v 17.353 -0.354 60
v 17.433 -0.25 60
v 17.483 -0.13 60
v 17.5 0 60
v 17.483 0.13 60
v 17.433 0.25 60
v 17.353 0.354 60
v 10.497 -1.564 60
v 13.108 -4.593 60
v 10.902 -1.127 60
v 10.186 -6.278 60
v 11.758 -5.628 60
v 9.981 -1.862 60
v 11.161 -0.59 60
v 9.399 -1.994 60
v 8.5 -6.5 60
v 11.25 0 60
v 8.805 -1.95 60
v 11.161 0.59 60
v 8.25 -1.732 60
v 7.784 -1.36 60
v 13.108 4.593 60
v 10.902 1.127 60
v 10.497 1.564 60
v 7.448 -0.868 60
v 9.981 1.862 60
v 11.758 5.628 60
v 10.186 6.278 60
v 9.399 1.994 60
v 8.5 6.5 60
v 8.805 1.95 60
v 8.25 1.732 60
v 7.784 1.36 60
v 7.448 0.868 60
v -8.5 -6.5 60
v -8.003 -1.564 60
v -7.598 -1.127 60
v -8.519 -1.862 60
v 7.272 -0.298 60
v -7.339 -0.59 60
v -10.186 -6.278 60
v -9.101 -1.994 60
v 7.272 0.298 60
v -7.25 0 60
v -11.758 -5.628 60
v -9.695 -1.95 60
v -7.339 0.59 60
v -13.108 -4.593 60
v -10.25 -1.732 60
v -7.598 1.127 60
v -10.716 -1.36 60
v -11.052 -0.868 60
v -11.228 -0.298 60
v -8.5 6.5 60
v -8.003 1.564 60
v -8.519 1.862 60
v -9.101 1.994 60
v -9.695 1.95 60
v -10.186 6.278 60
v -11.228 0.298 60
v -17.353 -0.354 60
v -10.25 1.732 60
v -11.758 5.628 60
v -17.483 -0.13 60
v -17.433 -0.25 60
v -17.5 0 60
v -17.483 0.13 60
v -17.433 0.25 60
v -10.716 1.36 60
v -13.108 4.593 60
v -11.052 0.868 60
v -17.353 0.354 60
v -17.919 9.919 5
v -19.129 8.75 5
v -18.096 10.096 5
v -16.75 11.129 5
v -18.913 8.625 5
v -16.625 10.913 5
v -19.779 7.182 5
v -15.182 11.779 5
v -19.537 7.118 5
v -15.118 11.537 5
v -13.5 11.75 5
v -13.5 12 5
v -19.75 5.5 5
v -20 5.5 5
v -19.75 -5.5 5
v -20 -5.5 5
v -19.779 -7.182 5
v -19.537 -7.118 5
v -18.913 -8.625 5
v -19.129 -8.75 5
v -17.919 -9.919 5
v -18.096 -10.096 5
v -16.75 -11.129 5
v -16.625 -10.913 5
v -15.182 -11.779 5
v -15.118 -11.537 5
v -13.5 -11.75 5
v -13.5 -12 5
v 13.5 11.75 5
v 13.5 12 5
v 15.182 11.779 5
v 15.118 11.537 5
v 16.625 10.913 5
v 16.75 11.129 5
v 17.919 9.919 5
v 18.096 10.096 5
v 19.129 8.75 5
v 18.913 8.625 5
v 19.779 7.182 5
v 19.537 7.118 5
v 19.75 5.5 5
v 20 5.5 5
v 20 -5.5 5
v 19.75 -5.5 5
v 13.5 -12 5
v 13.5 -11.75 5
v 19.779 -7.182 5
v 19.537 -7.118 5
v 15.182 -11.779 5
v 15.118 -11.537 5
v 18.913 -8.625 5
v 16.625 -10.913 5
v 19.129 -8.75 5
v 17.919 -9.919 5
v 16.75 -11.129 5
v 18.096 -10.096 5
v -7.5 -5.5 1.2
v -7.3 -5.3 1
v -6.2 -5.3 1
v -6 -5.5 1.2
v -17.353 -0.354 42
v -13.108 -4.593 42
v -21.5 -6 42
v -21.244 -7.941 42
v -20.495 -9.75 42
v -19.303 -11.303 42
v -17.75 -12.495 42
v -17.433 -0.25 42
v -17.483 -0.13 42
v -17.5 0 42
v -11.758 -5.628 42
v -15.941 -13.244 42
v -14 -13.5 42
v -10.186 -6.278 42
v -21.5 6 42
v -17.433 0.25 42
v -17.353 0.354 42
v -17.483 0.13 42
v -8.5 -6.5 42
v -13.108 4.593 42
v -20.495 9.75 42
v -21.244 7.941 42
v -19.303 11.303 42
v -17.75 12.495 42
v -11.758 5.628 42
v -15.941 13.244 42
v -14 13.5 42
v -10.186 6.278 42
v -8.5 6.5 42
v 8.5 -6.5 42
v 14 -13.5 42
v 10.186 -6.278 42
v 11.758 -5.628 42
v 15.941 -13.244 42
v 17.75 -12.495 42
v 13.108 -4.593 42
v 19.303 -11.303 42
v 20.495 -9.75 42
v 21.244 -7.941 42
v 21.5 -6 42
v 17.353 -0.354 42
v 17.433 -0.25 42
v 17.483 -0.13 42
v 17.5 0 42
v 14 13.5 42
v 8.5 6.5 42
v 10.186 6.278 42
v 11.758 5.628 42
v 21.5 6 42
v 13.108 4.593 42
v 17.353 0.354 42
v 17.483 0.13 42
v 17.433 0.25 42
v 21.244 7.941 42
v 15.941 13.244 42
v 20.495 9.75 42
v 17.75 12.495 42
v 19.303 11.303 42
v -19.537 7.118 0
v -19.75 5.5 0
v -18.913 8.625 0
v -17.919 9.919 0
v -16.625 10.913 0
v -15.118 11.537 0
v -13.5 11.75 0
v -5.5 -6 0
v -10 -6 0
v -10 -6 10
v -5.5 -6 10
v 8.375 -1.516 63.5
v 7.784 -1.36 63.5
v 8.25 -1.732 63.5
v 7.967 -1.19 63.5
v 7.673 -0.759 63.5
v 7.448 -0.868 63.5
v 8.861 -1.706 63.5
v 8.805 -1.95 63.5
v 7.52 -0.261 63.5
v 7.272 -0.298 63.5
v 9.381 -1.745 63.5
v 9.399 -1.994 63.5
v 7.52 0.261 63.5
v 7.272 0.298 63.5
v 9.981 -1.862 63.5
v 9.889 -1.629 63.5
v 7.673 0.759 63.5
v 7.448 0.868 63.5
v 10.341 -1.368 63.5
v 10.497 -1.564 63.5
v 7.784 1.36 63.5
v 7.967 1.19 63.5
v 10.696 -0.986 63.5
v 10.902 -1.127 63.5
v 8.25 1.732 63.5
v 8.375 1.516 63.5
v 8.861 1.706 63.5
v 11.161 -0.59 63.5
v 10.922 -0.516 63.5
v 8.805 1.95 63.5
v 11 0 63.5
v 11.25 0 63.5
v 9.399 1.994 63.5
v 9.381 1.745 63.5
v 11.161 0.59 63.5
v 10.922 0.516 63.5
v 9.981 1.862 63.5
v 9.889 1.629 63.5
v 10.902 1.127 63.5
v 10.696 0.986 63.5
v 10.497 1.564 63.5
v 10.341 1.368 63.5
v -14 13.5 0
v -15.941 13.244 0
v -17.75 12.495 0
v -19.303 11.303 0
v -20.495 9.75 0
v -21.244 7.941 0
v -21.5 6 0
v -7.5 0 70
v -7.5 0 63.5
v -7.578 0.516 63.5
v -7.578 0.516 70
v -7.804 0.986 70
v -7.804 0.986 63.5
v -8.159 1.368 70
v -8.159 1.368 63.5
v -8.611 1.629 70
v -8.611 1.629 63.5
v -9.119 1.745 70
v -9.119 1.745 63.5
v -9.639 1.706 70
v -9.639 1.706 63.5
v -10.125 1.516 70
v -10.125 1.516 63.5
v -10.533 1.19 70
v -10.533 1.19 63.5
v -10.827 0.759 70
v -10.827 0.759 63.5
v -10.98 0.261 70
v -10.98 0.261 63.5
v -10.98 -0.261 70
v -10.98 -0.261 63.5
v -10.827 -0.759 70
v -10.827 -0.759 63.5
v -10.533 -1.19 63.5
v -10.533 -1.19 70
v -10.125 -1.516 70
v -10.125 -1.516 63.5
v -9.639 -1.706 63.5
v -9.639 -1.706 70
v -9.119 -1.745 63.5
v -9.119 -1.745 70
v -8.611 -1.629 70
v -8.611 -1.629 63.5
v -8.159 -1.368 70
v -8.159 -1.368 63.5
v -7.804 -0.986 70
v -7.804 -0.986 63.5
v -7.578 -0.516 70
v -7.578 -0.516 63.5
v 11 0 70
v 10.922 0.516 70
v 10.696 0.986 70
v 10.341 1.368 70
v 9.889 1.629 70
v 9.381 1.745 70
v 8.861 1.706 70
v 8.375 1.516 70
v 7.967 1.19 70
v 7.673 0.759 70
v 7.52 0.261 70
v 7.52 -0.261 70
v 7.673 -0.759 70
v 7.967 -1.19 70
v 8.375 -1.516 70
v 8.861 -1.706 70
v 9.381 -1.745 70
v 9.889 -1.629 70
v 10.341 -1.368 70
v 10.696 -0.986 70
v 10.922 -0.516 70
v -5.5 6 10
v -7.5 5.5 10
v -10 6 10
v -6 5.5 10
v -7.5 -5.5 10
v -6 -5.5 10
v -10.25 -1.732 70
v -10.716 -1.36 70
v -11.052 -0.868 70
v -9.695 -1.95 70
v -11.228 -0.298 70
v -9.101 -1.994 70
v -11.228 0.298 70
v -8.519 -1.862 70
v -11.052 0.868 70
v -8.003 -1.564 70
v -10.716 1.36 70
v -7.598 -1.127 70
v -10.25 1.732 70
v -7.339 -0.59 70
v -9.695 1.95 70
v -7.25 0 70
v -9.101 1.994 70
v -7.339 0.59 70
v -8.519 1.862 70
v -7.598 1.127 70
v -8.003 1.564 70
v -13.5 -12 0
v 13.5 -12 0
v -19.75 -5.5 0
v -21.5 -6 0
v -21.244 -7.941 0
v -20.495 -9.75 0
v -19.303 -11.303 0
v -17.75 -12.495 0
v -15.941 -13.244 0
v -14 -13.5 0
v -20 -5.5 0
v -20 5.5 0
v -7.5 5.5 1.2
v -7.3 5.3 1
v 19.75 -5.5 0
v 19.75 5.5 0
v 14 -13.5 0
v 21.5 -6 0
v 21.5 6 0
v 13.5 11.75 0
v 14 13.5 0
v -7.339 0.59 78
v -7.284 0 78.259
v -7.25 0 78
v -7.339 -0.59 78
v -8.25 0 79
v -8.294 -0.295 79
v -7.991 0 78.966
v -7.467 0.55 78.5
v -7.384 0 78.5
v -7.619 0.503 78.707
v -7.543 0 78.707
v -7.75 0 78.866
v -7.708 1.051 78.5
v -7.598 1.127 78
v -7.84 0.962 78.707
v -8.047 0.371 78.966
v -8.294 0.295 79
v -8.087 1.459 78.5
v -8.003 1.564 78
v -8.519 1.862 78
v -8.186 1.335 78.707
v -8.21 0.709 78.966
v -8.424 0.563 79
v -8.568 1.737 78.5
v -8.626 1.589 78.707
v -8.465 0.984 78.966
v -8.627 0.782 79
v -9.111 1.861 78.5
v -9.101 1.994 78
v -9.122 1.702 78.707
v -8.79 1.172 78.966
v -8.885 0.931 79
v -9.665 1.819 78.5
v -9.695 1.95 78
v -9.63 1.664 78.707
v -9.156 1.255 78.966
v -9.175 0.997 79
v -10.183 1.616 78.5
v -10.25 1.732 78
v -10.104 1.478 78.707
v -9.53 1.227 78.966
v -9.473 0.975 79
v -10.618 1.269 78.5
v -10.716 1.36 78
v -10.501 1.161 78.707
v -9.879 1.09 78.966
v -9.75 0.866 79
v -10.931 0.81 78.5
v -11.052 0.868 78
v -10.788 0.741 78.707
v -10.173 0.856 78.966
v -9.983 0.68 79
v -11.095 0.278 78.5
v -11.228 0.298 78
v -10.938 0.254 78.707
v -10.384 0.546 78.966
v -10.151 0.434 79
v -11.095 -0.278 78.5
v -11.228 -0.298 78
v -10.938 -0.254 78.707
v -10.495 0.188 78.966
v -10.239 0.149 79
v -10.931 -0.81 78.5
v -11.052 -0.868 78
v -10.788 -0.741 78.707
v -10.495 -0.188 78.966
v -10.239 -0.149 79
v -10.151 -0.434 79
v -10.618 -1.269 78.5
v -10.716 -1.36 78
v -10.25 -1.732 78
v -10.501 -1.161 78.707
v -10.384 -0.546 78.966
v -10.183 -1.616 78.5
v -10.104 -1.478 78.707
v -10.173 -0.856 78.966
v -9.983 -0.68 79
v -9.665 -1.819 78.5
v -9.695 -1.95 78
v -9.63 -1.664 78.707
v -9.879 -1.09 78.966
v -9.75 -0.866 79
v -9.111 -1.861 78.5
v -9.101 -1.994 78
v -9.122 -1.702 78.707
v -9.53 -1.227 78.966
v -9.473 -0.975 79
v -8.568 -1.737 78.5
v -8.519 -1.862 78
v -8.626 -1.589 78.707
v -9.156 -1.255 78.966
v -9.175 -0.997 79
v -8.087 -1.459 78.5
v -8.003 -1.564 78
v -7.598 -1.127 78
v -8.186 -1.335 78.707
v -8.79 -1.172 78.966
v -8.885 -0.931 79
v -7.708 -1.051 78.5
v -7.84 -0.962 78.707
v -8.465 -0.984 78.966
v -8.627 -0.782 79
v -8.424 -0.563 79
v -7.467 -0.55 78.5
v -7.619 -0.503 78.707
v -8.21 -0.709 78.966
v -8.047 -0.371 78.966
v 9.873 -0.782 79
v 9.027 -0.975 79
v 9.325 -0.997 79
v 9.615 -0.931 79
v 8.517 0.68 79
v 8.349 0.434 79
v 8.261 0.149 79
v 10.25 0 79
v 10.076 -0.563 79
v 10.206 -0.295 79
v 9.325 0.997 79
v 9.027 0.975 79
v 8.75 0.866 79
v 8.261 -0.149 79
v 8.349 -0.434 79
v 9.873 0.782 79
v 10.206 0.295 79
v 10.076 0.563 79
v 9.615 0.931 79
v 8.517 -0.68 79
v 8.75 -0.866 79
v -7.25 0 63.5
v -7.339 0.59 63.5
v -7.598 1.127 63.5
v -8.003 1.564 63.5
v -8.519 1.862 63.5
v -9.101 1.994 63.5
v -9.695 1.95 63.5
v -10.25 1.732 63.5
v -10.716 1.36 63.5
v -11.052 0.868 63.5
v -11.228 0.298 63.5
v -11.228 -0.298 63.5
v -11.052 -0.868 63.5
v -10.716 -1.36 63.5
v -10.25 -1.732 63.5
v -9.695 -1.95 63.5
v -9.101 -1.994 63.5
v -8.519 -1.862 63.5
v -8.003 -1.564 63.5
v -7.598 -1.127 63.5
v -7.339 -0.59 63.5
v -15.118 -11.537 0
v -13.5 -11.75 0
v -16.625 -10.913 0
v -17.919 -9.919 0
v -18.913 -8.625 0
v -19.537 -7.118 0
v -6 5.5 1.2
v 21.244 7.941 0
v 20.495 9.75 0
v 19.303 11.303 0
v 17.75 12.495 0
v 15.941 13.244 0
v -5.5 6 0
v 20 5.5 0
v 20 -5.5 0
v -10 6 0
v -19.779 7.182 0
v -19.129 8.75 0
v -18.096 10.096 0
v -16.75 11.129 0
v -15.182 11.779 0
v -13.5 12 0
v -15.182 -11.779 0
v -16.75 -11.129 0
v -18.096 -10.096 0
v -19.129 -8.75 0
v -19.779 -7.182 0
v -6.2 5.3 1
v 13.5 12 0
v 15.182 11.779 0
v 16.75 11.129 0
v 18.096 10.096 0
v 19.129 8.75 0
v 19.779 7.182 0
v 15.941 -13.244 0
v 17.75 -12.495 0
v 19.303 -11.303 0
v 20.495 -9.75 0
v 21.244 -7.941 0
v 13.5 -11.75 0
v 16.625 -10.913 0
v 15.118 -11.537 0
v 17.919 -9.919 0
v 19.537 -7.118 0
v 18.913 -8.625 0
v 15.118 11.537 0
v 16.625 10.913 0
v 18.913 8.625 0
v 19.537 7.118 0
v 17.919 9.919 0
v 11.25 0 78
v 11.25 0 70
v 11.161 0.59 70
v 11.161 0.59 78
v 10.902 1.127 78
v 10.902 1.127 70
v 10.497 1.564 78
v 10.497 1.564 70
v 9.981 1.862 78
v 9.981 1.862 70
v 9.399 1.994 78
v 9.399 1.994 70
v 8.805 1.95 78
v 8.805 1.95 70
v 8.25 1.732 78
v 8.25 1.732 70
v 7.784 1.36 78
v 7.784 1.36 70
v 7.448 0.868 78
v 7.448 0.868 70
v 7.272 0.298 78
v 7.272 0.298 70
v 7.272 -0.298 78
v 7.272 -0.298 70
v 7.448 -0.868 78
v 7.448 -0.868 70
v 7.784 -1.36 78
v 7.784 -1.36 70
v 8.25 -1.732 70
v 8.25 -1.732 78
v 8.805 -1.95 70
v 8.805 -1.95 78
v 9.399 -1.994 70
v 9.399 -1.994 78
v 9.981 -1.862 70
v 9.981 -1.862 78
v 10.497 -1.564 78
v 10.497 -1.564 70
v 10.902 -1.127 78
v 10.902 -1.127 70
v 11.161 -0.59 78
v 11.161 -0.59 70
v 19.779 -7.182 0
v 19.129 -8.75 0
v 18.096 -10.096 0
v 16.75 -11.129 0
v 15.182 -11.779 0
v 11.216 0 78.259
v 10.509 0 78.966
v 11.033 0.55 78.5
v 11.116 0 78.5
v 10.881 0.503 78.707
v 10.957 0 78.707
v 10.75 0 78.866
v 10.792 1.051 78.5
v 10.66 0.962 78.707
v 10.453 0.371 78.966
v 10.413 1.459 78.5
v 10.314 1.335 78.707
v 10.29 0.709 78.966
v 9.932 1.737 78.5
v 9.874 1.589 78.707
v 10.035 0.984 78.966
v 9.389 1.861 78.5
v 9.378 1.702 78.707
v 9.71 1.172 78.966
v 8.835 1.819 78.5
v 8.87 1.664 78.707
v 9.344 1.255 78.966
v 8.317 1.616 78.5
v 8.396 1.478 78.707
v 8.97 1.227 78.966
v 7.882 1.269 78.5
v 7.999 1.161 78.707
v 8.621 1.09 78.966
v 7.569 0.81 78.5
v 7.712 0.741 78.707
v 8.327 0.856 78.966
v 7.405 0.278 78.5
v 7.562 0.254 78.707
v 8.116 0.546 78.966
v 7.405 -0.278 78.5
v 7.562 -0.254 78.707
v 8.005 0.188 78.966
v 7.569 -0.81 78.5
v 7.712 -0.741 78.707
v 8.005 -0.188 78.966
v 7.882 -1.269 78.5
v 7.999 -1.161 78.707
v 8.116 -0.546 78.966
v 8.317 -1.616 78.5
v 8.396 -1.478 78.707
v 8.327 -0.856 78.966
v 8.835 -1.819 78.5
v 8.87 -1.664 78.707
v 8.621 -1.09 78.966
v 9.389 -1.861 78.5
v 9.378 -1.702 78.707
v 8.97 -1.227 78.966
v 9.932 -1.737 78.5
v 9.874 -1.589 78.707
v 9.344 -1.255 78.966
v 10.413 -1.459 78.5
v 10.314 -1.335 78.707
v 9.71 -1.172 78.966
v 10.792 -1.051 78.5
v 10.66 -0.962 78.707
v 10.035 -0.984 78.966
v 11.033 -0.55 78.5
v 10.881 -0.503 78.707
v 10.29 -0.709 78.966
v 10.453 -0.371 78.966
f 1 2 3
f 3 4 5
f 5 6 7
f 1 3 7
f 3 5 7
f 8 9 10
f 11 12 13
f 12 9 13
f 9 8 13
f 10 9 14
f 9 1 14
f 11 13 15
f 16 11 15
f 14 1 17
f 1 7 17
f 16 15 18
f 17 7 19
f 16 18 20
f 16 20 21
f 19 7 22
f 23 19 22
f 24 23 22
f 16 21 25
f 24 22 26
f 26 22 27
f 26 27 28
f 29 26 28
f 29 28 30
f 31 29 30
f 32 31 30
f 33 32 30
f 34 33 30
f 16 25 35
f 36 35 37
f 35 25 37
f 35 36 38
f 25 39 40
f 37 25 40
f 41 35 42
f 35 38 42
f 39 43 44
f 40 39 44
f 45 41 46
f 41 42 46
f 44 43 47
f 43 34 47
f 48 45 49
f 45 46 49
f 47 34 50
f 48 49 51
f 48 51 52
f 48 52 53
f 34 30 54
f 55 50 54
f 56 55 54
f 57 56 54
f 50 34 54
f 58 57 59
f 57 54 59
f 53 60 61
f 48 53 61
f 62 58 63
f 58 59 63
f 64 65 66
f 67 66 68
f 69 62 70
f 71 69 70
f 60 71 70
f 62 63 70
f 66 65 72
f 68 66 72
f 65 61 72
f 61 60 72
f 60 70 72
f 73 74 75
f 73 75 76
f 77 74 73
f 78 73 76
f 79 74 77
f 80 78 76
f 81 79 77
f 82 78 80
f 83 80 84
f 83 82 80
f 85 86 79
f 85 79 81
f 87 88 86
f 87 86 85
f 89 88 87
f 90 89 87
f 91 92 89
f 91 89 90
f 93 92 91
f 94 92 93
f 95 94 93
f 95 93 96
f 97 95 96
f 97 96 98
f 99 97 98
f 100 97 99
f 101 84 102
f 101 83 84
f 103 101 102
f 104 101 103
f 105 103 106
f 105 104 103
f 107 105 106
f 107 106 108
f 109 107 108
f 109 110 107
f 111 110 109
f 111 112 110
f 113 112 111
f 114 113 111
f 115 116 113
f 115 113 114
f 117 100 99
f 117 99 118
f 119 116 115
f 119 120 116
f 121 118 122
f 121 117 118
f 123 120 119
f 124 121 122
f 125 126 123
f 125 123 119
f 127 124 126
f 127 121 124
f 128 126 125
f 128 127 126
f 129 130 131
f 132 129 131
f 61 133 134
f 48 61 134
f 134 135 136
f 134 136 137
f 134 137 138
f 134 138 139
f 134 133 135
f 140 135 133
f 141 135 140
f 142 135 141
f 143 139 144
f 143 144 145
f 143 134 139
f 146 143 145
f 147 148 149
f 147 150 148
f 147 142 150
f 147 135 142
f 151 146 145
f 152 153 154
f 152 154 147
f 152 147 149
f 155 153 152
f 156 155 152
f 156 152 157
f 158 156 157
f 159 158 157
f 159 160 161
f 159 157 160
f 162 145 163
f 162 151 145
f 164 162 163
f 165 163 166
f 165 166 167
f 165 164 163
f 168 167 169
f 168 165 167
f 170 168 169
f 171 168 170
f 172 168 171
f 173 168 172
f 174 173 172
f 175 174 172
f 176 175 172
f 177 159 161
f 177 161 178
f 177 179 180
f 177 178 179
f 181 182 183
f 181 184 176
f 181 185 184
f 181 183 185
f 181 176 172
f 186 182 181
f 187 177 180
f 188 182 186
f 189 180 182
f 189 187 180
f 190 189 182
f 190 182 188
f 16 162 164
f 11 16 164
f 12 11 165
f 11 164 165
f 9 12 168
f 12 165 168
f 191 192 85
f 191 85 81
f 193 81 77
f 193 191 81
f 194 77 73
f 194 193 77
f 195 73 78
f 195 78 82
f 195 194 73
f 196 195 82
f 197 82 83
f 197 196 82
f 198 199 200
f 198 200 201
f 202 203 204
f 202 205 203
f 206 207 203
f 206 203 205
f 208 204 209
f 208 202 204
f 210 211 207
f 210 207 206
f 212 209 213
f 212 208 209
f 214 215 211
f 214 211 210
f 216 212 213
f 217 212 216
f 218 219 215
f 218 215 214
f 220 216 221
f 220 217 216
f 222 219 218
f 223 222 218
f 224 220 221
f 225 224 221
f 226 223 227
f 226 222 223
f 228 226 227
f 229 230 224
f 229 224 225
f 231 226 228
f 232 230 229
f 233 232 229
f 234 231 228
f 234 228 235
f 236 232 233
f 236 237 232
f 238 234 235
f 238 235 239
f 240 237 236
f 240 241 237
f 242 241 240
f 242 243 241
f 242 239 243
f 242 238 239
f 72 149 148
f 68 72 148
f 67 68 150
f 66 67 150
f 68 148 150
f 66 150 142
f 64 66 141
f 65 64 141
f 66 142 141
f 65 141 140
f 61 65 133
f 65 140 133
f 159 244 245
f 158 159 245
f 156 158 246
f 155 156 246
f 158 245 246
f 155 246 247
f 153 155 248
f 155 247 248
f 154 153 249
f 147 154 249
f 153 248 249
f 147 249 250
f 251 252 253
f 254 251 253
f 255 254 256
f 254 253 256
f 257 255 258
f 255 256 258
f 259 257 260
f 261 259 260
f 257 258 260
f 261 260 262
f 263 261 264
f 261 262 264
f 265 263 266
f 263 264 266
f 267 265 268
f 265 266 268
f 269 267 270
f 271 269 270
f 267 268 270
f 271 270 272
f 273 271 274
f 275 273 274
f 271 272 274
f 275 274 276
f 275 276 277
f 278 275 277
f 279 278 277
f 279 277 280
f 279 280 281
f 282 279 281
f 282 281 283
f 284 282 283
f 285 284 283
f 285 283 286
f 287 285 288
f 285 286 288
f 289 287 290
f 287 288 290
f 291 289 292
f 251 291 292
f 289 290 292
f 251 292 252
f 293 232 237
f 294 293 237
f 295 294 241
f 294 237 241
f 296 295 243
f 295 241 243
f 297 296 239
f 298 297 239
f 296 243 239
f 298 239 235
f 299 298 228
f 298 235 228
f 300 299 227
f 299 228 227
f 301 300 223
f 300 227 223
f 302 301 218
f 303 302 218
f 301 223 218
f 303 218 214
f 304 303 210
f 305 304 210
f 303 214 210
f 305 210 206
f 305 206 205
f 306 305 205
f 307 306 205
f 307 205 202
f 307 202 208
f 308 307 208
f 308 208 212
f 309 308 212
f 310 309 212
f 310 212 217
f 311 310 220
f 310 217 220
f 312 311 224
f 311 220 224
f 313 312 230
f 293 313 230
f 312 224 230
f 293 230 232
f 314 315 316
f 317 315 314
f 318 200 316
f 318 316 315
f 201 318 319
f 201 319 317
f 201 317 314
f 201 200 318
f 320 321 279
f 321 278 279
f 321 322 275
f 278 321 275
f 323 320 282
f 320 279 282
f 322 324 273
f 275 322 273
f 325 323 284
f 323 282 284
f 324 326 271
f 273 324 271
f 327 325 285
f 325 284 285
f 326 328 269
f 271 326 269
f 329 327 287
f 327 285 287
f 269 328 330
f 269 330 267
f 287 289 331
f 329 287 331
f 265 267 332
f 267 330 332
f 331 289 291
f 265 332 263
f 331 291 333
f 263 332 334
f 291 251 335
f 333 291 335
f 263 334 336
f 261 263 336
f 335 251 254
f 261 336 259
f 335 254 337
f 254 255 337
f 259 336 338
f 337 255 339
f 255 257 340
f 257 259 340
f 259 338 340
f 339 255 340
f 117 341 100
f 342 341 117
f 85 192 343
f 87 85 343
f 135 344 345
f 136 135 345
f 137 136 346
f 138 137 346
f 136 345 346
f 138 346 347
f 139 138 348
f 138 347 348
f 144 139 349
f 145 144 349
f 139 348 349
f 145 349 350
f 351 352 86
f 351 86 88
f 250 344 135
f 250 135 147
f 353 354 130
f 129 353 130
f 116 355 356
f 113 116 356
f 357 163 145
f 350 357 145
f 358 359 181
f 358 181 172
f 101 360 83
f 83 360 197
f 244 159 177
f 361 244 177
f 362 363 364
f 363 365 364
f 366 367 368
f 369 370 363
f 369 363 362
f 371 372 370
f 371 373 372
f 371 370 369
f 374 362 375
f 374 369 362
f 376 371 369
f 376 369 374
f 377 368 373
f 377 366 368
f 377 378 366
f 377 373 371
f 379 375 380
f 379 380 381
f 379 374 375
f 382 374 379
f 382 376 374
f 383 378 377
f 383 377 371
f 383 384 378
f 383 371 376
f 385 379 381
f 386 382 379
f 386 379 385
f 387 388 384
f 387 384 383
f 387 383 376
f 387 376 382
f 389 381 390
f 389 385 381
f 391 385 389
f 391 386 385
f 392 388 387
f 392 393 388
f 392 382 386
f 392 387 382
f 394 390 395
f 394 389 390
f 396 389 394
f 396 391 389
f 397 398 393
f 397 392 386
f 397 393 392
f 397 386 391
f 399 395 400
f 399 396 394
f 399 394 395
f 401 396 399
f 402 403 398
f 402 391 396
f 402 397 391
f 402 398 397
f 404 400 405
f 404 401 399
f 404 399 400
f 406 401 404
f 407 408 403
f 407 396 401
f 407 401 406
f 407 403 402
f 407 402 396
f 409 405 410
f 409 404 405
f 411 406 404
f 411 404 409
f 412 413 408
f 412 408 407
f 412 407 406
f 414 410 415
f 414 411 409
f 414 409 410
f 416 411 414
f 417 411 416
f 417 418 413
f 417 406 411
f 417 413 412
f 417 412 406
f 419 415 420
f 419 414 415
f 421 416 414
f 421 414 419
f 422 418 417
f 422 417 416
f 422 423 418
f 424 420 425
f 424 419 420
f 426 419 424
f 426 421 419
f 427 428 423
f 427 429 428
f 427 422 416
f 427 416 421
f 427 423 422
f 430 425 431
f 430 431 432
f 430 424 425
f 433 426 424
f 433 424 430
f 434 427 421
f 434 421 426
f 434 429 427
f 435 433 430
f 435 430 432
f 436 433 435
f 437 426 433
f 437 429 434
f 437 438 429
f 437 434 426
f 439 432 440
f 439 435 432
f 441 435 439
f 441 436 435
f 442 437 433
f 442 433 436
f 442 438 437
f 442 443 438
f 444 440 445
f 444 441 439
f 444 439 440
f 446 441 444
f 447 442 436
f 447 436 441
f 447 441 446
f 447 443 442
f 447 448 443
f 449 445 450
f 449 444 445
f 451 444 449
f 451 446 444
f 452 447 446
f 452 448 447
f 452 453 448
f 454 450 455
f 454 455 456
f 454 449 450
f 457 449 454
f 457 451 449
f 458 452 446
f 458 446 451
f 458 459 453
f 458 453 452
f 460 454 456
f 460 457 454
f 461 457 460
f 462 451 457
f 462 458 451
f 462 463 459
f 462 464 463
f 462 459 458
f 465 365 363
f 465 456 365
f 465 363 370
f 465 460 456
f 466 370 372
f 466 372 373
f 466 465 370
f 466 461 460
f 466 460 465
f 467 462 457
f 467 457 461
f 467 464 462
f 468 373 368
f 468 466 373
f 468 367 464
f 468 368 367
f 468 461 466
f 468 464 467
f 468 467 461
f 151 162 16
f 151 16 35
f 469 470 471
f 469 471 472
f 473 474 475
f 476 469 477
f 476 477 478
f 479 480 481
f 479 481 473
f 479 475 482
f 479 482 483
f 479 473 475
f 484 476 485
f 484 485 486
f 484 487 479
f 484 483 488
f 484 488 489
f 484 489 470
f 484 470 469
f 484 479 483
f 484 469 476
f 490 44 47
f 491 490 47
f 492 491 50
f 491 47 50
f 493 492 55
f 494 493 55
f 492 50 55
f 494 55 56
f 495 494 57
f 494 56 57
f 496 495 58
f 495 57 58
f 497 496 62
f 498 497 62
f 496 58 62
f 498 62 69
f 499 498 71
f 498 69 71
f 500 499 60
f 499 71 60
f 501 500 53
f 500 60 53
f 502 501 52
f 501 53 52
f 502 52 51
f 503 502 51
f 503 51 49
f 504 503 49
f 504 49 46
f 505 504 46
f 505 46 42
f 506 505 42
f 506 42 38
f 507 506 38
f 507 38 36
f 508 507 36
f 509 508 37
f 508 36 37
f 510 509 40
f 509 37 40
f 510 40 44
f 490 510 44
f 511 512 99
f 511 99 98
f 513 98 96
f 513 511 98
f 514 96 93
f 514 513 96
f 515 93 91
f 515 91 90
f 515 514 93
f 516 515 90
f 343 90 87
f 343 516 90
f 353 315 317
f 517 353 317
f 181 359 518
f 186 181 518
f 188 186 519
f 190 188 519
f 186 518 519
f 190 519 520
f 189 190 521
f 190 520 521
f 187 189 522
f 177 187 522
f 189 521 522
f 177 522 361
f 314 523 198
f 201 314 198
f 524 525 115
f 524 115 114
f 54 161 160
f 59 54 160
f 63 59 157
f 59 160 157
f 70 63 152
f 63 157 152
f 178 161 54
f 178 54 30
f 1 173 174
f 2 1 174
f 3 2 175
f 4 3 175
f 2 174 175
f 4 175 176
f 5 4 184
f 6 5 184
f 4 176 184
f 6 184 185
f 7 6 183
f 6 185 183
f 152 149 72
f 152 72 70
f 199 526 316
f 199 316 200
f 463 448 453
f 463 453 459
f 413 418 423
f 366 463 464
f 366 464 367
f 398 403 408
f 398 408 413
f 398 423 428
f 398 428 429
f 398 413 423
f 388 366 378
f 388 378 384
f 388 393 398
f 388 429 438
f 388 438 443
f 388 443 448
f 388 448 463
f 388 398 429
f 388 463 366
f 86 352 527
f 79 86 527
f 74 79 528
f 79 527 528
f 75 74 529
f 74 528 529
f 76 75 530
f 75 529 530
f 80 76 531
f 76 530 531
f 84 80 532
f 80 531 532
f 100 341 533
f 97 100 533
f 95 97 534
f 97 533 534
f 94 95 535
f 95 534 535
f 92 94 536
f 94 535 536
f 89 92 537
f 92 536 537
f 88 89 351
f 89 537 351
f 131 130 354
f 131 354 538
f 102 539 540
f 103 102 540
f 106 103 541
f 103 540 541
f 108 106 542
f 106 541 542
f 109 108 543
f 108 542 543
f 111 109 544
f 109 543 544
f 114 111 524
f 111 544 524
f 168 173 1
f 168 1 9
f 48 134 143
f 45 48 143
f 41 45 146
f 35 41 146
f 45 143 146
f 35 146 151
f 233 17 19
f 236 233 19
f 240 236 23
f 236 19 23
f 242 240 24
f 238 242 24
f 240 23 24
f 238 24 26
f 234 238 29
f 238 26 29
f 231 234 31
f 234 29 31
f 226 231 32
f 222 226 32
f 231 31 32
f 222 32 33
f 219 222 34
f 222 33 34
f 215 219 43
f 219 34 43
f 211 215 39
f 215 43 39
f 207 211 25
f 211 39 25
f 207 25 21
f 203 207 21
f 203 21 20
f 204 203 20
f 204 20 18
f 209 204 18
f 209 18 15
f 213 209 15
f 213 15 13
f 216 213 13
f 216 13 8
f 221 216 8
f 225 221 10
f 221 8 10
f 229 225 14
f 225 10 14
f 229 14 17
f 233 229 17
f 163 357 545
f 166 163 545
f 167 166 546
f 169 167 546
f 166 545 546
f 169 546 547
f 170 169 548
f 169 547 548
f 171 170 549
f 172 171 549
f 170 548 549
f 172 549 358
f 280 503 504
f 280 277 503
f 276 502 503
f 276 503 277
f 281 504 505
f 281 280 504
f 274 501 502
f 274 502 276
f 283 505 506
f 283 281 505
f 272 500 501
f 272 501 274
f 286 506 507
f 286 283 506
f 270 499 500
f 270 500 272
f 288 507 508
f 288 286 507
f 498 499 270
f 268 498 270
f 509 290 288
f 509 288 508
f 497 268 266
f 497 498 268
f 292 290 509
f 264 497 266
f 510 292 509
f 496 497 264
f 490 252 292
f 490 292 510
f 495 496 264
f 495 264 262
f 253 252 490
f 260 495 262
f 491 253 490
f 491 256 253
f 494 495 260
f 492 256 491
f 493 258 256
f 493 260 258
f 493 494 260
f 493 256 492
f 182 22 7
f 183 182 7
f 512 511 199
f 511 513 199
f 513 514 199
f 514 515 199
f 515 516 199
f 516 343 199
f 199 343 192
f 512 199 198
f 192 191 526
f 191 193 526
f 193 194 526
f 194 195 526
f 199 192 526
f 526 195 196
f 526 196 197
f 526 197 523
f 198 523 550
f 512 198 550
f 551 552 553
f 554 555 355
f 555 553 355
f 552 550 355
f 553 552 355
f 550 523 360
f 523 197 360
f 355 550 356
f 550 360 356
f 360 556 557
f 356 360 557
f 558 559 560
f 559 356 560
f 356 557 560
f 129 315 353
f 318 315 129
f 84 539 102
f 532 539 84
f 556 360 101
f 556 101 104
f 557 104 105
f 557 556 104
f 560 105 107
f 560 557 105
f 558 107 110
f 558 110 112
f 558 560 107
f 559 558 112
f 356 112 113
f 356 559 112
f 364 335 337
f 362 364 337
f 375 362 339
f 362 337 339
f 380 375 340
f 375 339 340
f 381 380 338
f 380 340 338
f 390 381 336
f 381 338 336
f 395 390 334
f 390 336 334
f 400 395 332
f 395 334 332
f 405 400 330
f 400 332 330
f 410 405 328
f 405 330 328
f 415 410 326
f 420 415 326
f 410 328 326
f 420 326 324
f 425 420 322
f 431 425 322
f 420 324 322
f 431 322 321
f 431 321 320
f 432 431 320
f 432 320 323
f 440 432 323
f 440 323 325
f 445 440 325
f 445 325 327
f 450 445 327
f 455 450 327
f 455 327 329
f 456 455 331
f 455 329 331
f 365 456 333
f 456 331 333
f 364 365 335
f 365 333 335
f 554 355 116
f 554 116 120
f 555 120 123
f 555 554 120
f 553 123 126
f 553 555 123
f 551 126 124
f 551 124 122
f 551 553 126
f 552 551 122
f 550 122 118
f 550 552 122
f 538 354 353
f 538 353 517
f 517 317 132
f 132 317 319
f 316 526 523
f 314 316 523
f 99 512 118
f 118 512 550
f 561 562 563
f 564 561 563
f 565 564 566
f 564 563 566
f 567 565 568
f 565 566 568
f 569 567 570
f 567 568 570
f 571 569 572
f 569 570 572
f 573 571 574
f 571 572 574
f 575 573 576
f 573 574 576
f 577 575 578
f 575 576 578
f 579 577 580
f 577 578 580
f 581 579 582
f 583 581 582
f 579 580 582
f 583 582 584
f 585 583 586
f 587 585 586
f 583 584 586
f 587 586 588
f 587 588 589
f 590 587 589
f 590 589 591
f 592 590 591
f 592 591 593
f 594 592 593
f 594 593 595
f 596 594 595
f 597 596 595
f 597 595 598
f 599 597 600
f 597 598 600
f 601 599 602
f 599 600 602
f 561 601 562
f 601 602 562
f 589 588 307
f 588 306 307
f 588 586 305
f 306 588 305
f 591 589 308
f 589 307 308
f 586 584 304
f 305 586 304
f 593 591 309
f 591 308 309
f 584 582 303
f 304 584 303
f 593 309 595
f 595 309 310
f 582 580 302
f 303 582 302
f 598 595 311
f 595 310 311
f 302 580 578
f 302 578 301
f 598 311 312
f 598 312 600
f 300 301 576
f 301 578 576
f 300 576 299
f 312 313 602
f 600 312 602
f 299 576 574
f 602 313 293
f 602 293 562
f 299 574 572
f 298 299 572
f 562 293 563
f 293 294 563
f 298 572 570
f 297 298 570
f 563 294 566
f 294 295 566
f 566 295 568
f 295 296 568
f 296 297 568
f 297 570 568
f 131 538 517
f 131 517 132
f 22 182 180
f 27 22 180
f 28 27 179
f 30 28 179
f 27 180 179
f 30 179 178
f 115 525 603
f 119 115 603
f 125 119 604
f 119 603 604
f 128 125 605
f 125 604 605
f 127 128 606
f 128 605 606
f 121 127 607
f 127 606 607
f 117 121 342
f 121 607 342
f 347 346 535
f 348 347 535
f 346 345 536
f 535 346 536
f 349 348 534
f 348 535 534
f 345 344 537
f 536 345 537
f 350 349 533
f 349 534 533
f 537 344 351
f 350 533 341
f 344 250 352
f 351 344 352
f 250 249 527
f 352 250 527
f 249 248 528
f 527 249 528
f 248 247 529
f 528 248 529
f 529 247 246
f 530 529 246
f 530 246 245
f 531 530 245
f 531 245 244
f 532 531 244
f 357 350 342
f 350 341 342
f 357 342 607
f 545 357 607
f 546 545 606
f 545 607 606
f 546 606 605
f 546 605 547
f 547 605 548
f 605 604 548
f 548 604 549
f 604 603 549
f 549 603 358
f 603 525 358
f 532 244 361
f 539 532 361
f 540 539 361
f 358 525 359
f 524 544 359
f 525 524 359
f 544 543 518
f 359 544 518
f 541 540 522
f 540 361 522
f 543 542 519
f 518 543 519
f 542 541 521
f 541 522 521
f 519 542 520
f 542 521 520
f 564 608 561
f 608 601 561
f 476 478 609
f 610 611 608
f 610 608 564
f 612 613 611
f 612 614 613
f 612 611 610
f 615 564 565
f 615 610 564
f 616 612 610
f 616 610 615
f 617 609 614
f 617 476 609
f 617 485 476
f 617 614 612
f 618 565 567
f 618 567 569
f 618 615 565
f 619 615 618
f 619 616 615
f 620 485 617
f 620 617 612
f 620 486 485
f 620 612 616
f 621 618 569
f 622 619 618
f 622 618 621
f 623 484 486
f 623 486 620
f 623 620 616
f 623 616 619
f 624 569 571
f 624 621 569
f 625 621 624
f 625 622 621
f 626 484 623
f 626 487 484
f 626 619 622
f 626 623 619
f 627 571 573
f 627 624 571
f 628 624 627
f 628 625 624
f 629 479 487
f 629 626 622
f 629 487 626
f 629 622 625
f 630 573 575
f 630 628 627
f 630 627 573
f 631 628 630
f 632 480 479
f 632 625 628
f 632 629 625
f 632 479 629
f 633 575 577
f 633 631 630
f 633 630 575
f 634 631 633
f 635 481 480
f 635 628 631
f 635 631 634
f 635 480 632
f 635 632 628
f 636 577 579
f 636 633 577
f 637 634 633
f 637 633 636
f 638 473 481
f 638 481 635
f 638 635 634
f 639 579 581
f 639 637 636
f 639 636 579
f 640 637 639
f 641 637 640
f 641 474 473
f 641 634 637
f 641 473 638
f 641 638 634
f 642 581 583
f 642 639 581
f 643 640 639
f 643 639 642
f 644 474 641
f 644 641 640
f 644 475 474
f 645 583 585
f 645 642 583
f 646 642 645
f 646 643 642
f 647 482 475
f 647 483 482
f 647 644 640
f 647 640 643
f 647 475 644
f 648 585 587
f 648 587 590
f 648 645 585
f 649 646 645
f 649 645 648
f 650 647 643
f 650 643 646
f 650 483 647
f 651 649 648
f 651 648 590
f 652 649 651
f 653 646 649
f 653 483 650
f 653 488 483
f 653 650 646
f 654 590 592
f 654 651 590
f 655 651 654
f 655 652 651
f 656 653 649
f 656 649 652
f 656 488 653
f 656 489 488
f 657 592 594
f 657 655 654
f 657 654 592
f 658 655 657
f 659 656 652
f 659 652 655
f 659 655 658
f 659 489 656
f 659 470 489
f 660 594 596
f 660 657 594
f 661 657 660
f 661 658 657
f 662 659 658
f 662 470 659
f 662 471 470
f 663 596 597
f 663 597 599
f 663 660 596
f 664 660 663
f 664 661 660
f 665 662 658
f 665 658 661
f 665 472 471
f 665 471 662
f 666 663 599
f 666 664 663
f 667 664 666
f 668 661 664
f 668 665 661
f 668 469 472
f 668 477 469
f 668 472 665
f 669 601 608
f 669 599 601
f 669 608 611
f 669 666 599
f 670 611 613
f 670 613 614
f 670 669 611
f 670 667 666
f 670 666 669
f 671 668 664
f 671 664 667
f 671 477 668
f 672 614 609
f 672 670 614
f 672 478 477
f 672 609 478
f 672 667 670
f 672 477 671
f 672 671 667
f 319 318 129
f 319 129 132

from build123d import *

# Parameters (mm, degrees)
PAD_DEPTH       = 42
PAD001_DEPTH    = 18
SKETCH002_R     = 2
PAD002_DEPTH    = 3.5
SKETCH003_R     = 1.75
PAD003_DEPTH    = 6.5
SKETCH004_R     = 2
PAD004_DEPTH    = 9
FILLET_R        = 1
POCKET_DEPTH    = 5
SKETCH006_W     = 4.5
SKETCH006_H     = 12
POCKET001_DEPTH = 10
SKETCH007_W     = 1.5
SKETCH007_H     = 11
PAD005_DEPTH    = 9
CHAMFER_SIZE    = 0.2


with BuildPart() as part:
    # Sketch → Pad (new body)
    with BuildSketch(Plane.XY):
        with BuildLine():
            ThreePointArc((-14, 13.5), (-19.303301, 11.303301), (-21.5, 6))
            Line((-21.5, -6), (-21.5, 6))
            ThreePointArc((-21.5, -6), (-19.303301, -11.303301), (-14, -13.5))
            Line((14, -13.5), (-14, -13.5))
            ThreePointArc((14, -13.5), (19.303301, -11.303301), (21.5, -6))
            Line((21.5, 6), (21.5, -6))
            ThreePointArc((21.5, 6), (19.303301, 11.303301), (14, 13.5))
            Line((-14, 13.5), (14, 13.5))
        make_face()
    extrude(amount=PAD_DEPTH)

    # Sketch001 (on Face10 of Pad) → Pad001 (join)
    with BuildSketch(Plane.XY.offset(42)):
        with BuildLine():
            Line((-8.5, 6.5), (8.5, 6.5))
            ThreePointArc((13.107614, 4.593401), (10.993252, 6.004526), (8.5, 6.5))
            Line((13.107614, 4.593401), (17.353299, 0.353807))
            ThreePointArc((17.353299, -0.353807), (17.5, 0), (17.353299, 0.353807))
            Line((17.353299, -0.353807), (13.107614, -4.593401))
            ThreePointArc((8.5, -6.5), (10.993252, -6.004526), (13.107614, -4.593401))
            Line((8.5, -6.5), (-8.5, -6.5))
            ThreePointArc((-13.107614, -4.593401), (-10.993252, -6.004526), (-8.5, -6.5))
            Line((-17.353299, -0.353807), (-13.107614, -4.593401))
            ThreePointArc((-17.353299, 0.353807), (-17.5, 0), (-17.353299, -0.353807))
            Line((-17.353299, 0.353807), (-13.107614, 4.593401))
            ThreePointArc((-8.5, 6.5), (-10.993252, 6.004526), (-13.107614, 4.593401))
        make_face()
    extrude(amount=PAD001_DEPTH)

    # Sketch002 (on Face23 of Pad001) → Pad002 (join)
    with BuildSketch(Plane.XY.offset(60)):
        with Locations((-9.25, 0)):
            Circle(SKETCH002_R)
        with Locations((9.25, 0)):
            Circle(SKETCH002_R)
    extrude(amount=PAD002_DEPTH)

    # Sketch003 (on Face27 of Pad002) → Pad003 (join)
    with BuildSketch(Plane.XY.offset(63.5)):
        with Locations((9.25, 0)):
            Circle(SKETCH003_R)
        with Locations((-9.25, 0)):
            Circle(SKETCH003_R)
    extrude(amount=PAD003_DEPTH)

    # Sketch004 (on Face31 of Pad003) → Pad004 (join)
    with BuildSketch(Plane.XY.offset(70)):
        with Locations((9.25, 0)):
            Circle(SKETCH004_R)
        with Locations((-9.25, 0)):
            Circle(SKETCH004_R)
    extrude(amount=PAD004_DEPTH)

    # Fillet
    fillet_edges = [part.edges().sort_by_distance(p)[0] for p in [
        (-11.25, 0, 79),
        (7.25, 0, 79),
    ]]
    fillet(fillet_edges, radius=FILLET_R)

    # Sketch005 (on Face33 of Fillet) → Pocket (cut)
    with BuildSketch(Plane(origin=(0, 0, 0), x_dir=(1, 0, 0), z_dir=(0, 0, -1))):
        with BuildLine():
            ThreePointArc((-13.5, 12), (-18.096194, 10.096194), (-20, 5.5))
            Line((-20, -5.5), (-20, 5.5))
            ThreePointArc((-20, -5.5), (-18.096194, -10.096194), (-13.5, -12))
            Line((13.5, -12), (-13.5, -12))
            ThreePointArc((13.5, -12), (18.096194, -10.096194), (20, -5.5))
            Line((20, 5.5), (20, -5.5))
            ThreePointArc((20, 5.5), (18.096194, 10.096194), (13.5, 12))
            Line((-13.5, 12), (13.5, 12))
        make_face()
        with BuildLine():
            ThreePointArc((-13.5, 11.75), (-17.919417, 9.919417), (-19.75, 5.5))
            Line((-19.75, -5.5), (-19.75, 5.5))
            ThreePointArc((-19.75, -5.5), (-17.919417, -9.919417), (-13.5, -11.75))
            Line((13.5, -11.75), (-13.5, -11.75))
            ThreePointArc((13.5, -11.75), (17.919417, -9.919417), (19.75, -5.5))
            Line((19.75, 5.5), (19.75, -5.5))
            ThreePointArc((19.75, 5.5), (17.919417, 9.919417), (13.5, 11.75))
            Line((-13.5, 11.75), (13.5, 11.75))
        make_face(mode=Mode.SUBTRACT)
    extrude(amount=-POCKET_DEPTH, mode=Mode.SUBTRACT)

    # Sketch006 (on Face55 of Pocket) → Pocket001 (cut)
    with BuildSketch(Plane(origin=(0, 0, 0), x_dir=(1, 0, 0), z_dir=(0, 0, -1))):
        with Locations((-7.75, 0)):
            Rectangle(SKETCH006_W, SKETCH006_H)
    extrude(amount=-POCKET001_DEPTH, mode=Mode.SUBTRACT)

    # Sketch007 (on Face60 of Pocket001) → Pad005 (join)
    with BuildSketch(Plane(origin=(0, 0, 10), x_dir=(1, 0, 0), z_dir=(0, 0, -1))):
        with Locations((-6.75, 0)):
            Rectangle(SKETCH007_W, SKETCH007_H)
    extrude(amount=PAD005_DEPTH)

    # Chamfer
    chamfer_edges = [part.edges().sort_by_distance(p)[0] for p in [
        (-7.5, 0, 1),
        (-6.75, 5.5, 1),
        (-6, 0, 1),
        (-6.75, -5.5, 1),
    ]]
    chamfer(chamfer_edges, length=CHAMFER_SIZE)


solid = part.part
